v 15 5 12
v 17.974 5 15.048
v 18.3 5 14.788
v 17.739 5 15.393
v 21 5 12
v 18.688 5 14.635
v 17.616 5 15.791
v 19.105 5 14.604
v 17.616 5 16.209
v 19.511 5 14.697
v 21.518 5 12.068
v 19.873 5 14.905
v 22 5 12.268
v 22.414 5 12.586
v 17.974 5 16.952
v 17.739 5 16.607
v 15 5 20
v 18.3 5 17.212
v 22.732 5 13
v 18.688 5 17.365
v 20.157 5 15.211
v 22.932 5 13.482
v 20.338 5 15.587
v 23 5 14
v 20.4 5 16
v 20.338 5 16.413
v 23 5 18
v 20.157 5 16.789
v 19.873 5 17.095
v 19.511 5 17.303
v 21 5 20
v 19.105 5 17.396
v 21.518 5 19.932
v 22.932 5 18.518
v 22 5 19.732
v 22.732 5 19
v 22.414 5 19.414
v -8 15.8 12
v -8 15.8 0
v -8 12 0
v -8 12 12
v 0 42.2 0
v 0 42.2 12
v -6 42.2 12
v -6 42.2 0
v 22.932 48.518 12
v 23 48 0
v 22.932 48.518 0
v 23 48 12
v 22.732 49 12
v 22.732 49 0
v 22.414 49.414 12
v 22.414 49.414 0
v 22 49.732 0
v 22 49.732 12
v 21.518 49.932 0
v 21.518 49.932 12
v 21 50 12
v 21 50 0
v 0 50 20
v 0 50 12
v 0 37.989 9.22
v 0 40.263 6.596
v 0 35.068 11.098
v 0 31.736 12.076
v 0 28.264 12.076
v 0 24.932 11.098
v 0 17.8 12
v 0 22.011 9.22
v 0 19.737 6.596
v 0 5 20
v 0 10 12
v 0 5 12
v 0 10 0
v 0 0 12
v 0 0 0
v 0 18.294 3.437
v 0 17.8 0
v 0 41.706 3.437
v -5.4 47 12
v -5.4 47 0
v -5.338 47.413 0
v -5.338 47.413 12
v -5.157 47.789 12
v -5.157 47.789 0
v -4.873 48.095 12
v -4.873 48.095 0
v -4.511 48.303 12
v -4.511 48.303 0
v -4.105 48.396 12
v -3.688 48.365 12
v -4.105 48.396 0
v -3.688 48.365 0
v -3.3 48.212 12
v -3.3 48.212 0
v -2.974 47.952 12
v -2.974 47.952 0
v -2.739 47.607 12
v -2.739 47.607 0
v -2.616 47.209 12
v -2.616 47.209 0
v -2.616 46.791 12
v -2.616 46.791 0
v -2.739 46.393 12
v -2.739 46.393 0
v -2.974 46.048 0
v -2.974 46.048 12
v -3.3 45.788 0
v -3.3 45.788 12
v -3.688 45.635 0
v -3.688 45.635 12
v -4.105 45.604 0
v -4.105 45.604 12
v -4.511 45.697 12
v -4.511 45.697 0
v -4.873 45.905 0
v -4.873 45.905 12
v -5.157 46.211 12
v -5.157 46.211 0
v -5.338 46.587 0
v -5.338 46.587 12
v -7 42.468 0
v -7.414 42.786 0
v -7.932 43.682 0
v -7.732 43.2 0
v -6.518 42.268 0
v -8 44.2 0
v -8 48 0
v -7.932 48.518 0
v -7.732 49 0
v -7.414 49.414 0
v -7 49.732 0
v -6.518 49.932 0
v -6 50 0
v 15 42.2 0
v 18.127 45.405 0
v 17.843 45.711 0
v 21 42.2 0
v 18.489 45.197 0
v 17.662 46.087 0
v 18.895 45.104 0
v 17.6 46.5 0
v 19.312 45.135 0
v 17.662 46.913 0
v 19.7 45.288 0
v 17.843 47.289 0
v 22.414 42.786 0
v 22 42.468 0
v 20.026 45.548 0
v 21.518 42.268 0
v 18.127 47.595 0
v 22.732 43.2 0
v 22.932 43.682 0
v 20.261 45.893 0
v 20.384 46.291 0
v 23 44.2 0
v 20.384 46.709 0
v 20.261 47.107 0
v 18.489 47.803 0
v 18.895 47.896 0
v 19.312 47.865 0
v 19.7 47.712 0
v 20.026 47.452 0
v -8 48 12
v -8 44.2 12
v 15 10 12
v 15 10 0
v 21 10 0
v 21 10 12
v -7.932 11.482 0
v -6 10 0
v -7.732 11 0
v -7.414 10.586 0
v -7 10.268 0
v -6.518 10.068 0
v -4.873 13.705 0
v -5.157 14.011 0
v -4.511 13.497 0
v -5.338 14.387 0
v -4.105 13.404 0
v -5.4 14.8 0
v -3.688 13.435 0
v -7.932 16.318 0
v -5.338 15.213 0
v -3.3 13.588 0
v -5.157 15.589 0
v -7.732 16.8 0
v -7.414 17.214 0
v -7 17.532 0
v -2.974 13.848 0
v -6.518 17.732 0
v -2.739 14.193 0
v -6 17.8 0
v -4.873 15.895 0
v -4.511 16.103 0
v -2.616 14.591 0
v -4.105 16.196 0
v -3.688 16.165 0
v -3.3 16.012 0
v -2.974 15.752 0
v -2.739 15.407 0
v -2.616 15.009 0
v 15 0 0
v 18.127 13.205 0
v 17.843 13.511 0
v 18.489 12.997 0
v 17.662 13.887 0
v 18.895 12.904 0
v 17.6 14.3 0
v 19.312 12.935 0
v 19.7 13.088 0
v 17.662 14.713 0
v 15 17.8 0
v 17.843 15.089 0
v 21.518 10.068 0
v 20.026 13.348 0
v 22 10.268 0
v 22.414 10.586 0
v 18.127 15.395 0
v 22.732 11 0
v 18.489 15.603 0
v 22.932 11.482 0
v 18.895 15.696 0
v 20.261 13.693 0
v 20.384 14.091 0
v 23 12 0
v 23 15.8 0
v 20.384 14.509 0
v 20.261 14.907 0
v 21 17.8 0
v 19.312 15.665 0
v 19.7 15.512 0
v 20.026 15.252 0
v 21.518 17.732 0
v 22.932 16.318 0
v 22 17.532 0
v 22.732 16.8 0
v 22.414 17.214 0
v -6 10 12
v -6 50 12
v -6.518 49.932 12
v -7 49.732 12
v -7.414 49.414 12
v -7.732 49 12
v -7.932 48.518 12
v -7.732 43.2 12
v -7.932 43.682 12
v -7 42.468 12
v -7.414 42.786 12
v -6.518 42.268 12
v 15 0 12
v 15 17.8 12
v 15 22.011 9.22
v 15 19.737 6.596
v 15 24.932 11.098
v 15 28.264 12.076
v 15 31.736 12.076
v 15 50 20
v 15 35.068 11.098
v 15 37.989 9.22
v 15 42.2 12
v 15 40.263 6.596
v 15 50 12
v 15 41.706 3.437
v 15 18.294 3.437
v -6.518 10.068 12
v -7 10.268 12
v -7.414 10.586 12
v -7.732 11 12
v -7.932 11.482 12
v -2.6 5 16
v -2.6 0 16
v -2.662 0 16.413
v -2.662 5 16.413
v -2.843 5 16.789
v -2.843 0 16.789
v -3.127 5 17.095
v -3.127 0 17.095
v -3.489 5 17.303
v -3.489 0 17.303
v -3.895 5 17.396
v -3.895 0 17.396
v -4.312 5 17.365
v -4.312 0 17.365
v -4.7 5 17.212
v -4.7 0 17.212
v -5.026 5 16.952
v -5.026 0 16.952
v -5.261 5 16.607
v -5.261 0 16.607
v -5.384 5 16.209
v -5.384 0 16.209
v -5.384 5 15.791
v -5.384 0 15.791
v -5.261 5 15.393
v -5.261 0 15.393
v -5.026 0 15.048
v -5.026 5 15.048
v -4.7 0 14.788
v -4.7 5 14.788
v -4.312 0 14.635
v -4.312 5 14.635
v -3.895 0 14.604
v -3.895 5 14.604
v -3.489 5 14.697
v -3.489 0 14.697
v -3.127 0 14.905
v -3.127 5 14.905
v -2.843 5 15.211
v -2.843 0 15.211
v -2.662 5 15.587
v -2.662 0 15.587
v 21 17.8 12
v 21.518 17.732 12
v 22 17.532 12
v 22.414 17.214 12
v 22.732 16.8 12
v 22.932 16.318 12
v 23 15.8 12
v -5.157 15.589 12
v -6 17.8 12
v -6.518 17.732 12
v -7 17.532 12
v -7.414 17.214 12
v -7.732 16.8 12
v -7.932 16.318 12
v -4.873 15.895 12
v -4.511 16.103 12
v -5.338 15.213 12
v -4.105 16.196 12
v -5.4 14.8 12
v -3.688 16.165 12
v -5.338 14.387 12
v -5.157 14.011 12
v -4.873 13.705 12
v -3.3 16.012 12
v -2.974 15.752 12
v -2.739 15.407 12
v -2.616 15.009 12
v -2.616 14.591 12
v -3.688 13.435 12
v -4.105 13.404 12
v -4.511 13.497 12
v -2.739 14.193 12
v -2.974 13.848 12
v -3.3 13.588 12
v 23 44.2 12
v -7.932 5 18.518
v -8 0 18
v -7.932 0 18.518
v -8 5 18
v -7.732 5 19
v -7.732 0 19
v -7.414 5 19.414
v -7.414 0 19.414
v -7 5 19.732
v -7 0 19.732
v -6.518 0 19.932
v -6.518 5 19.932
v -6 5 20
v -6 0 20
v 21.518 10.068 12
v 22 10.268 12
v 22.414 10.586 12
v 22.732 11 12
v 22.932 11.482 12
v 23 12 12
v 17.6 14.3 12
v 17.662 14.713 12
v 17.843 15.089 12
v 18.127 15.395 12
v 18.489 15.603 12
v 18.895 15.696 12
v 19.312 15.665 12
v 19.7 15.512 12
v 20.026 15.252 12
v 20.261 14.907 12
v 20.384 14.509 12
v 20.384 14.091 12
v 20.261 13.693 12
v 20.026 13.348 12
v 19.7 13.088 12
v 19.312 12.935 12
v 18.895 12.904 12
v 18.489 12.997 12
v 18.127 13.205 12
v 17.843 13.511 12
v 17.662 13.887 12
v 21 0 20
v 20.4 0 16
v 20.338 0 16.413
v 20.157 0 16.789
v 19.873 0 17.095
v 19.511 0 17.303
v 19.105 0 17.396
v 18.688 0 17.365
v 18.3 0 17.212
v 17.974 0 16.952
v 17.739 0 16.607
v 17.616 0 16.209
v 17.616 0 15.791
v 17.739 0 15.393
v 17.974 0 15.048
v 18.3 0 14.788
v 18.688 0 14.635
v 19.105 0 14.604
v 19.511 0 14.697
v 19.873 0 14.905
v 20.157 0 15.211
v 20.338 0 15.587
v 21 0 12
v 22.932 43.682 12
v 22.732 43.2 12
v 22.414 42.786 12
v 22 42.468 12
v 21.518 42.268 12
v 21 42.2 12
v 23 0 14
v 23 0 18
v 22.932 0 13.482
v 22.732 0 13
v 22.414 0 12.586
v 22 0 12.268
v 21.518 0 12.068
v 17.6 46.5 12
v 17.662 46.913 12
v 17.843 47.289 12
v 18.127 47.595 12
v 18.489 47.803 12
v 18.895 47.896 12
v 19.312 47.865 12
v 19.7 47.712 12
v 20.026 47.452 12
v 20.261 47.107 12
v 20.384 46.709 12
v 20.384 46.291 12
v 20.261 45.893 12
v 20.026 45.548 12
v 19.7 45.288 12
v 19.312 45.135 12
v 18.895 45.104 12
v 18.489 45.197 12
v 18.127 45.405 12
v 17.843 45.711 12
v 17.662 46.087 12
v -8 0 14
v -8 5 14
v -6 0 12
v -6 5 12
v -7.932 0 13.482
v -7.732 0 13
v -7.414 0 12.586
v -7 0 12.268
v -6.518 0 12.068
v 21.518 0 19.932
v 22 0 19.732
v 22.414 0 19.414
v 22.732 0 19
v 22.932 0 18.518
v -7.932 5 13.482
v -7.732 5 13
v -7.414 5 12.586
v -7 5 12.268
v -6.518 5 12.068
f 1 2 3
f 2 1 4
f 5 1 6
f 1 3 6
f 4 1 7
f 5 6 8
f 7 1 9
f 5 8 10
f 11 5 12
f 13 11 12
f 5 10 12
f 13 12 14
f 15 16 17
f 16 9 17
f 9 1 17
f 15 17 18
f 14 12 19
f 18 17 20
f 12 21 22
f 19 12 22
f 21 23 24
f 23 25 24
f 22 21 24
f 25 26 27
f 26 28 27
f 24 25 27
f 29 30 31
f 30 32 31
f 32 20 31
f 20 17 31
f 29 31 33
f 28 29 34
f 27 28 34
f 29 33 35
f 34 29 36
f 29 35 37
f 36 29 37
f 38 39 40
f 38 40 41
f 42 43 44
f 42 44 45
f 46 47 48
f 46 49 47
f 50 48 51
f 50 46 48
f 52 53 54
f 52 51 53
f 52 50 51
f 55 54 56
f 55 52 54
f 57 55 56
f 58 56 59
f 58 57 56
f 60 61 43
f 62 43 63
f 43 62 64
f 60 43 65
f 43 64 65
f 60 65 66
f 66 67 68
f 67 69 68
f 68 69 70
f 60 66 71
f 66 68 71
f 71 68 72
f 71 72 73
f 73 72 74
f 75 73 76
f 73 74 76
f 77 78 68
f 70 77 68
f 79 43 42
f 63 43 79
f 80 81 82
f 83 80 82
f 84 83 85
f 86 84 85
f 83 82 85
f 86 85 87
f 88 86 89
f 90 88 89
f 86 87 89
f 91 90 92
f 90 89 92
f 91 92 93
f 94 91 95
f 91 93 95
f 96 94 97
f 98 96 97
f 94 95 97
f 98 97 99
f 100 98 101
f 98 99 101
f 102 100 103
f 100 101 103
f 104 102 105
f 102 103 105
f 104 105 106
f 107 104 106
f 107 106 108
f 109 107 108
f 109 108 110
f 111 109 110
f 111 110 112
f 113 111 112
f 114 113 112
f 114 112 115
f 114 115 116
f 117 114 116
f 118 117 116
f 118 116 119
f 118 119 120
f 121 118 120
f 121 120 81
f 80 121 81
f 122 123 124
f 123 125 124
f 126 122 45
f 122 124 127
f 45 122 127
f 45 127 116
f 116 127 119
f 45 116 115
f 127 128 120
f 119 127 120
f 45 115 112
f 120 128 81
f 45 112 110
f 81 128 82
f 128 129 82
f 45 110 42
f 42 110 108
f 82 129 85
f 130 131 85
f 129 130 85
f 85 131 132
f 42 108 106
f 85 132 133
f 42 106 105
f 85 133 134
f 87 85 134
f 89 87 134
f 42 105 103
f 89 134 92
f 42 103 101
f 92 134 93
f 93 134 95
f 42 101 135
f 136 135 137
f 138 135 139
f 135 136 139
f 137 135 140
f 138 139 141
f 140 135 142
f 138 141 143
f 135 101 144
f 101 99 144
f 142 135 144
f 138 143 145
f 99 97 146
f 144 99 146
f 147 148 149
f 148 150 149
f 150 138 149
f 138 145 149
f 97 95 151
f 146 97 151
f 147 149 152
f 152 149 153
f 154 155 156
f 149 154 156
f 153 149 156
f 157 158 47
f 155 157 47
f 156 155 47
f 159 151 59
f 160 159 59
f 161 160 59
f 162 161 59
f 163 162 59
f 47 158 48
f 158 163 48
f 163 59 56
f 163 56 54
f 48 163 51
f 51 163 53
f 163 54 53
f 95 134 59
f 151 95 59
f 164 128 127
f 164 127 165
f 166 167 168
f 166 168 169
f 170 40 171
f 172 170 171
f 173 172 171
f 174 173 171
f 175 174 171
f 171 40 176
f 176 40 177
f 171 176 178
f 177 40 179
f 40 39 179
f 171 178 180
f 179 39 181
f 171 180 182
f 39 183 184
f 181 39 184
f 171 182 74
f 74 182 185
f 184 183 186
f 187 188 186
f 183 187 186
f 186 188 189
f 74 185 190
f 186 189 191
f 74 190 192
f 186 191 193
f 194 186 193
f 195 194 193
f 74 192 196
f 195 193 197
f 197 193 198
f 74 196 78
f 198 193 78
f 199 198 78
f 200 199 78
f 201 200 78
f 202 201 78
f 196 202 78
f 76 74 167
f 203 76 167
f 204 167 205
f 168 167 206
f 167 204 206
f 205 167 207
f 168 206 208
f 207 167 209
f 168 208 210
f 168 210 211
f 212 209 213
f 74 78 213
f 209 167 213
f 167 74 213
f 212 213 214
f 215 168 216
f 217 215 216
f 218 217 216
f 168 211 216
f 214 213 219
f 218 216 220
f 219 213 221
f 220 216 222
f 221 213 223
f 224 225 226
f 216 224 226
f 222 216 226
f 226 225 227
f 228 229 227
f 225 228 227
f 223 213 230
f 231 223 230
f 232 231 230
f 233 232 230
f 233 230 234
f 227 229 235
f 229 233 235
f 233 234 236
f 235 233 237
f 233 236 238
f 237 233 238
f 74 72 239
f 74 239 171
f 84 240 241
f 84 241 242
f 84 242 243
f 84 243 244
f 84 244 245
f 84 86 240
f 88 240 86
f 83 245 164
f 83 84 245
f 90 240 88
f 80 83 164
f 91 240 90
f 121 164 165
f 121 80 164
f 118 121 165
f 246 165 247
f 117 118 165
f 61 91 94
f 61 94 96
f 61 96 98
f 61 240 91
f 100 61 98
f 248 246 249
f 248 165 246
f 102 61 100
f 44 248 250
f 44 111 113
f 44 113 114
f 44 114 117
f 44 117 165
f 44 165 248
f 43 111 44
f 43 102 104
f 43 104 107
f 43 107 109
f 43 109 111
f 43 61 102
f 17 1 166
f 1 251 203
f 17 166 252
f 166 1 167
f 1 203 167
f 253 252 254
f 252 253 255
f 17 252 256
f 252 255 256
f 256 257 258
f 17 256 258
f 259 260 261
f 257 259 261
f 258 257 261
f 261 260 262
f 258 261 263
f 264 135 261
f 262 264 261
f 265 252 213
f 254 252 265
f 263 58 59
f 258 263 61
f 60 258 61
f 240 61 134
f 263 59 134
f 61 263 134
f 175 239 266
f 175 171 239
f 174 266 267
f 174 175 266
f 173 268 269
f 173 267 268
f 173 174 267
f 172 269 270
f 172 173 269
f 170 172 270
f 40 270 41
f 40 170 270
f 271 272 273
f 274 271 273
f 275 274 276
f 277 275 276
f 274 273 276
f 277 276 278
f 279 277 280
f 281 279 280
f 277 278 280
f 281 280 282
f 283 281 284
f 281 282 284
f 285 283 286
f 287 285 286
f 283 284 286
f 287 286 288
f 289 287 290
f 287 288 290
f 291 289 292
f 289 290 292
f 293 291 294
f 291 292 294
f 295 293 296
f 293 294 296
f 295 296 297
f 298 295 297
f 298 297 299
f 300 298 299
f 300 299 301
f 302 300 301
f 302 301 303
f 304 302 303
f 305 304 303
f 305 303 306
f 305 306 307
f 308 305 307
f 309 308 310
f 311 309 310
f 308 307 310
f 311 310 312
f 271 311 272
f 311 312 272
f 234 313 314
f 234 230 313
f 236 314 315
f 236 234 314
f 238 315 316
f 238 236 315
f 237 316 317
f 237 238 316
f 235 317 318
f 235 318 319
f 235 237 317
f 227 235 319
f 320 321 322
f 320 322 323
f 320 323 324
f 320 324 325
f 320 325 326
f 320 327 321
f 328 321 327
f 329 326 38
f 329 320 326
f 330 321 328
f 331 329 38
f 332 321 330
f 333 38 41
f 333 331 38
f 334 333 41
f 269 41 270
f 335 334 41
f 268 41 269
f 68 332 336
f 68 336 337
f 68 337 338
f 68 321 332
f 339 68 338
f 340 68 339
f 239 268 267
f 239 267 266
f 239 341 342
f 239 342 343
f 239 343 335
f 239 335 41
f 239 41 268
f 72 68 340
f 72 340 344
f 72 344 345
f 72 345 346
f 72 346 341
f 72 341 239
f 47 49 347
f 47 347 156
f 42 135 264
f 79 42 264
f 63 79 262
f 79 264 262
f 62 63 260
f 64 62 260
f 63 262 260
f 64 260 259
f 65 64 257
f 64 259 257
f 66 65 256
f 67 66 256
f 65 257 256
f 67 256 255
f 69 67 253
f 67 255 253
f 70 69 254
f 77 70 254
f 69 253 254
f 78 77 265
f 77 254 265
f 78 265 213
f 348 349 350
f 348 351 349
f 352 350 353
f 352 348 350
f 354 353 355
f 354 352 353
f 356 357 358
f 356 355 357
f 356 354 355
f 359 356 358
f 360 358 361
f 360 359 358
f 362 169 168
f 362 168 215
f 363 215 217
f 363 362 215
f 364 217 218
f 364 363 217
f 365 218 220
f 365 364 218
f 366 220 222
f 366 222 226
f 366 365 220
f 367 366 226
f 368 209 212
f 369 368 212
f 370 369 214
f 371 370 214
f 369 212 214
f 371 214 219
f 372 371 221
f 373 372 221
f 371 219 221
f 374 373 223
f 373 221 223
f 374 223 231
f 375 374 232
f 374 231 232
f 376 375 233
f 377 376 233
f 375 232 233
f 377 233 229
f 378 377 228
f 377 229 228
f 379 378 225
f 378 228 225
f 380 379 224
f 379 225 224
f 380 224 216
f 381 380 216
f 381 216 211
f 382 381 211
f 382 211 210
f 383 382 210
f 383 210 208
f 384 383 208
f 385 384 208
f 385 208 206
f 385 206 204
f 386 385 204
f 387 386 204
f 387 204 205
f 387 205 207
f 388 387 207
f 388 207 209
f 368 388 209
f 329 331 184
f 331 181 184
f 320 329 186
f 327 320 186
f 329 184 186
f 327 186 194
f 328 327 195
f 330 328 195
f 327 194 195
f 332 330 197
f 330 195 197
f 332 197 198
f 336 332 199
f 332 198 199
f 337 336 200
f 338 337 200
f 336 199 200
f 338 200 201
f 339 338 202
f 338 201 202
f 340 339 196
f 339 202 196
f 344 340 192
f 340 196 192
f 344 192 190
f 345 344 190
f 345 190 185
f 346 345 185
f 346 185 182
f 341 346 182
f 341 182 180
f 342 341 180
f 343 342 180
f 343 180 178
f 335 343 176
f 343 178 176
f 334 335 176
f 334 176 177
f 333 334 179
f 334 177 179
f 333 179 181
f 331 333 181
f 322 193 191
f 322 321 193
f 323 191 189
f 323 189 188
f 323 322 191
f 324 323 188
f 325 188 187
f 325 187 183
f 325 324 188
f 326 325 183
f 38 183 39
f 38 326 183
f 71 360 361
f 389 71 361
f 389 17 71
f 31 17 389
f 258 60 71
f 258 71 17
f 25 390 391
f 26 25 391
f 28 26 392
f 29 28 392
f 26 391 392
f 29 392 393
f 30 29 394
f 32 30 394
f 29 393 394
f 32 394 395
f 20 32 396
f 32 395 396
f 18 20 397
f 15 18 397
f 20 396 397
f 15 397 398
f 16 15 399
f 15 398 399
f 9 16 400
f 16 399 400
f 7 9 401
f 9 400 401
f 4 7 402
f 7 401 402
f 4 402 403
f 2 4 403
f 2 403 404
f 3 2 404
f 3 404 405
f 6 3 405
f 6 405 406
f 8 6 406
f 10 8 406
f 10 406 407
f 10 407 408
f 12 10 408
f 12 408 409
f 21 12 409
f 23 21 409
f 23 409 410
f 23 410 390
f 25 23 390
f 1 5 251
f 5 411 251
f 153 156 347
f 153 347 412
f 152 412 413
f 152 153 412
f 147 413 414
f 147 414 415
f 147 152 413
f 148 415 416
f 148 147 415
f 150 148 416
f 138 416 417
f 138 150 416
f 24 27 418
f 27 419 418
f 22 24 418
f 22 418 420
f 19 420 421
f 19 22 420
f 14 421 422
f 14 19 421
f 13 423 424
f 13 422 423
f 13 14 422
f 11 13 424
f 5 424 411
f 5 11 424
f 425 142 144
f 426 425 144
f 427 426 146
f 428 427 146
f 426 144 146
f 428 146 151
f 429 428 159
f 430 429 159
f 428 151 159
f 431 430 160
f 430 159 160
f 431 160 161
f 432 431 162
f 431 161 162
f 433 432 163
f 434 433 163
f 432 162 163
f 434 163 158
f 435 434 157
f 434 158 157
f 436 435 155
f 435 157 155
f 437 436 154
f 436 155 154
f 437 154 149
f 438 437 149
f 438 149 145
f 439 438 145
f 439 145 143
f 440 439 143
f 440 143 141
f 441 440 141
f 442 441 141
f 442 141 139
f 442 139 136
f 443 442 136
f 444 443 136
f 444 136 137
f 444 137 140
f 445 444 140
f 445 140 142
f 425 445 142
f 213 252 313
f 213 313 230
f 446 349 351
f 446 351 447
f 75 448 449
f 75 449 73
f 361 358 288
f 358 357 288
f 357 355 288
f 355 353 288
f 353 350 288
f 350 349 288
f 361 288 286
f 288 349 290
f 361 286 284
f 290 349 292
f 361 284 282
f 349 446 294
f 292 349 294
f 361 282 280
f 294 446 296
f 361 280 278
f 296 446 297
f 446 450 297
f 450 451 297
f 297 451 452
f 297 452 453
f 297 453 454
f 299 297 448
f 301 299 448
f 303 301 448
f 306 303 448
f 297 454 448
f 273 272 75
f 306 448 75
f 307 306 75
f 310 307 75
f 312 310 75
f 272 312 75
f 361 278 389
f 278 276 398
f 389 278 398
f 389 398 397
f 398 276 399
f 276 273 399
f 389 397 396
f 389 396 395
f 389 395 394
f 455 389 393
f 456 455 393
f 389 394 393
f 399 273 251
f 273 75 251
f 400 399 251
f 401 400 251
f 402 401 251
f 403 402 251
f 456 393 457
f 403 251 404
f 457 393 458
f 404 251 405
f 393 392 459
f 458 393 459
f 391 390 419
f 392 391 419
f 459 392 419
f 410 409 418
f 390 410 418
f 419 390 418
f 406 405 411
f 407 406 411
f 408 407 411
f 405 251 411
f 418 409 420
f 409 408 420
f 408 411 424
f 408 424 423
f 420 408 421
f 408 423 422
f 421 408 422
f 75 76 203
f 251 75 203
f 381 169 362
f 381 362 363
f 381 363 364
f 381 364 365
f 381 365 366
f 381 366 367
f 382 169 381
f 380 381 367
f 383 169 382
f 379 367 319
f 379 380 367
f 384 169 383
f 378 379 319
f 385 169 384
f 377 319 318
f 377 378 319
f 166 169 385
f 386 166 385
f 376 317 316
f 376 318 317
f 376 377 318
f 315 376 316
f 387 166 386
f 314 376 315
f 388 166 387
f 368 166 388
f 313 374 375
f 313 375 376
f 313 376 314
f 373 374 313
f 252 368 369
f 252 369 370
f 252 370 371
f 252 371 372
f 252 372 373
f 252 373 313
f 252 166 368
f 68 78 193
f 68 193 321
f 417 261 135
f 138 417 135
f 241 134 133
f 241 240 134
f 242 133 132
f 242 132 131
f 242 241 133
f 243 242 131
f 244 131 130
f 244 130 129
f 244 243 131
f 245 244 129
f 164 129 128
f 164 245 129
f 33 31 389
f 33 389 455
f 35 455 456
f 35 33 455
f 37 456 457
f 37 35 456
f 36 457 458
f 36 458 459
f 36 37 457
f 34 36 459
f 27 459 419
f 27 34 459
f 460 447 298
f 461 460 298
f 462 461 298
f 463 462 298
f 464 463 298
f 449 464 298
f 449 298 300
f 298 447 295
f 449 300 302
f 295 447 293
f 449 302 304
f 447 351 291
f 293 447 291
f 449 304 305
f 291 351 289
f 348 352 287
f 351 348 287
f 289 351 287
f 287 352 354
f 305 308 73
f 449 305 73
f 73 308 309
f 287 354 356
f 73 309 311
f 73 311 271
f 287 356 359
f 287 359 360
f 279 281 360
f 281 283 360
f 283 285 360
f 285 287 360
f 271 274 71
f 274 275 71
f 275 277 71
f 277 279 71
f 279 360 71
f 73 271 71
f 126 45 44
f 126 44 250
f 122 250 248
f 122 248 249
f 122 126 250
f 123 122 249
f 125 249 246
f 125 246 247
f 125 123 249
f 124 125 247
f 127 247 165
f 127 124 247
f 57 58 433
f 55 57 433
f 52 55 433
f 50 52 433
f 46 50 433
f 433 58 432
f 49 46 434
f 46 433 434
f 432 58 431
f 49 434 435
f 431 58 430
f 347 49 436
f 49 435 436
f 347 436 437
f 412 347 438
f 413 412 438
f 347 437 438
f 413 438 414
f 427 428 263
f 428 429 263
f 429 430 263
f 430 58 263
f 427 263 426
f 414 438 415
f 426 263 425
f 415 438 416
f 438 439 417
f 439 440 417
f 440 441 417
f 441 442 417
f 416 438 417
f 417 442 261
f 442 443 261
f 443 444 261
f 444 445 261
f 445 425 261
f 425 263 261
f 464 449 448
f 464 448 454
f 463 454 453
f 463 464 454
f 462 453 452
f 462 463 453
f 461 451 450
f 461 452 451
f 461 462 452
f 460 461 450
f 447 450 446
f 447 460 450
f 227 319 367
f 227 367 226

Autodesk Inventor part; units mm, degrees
ref_plane "YZ Plane" through (0, 0, 0) normal (1, 0, 0) x (0, 1, 0)
ref_plane "XZ Plane" through (0, 0, 0) normal (0, 1, 0) x (-1, 0, 0)
sketch "Sketch1" plane through (0, 0, 0) normal (0, 0, 1) x (1, 0, 0)
  line L0 (0, 0) -> (15, 0)
  line L1 (15, 0) -> (15, 50)
  line L2 (15, 50) -> (0, 50)
  line L3 (0, 50) -> (0, 0)
  dimension "d0" = 15
  dimension "d1" = 50
extrude "Extrusion1" add sketch "Sketch1" along normal blind 20
sketch "Sketch2" plane through (15, 0, 0) normal (1, 0, 0) x (0, 0, -1)
  circle A0 centre (0, 30) radius 12.2
  line L0 (0, 50) -> (-20, 50) projected
  line L1 (0, 0) -> (0, 50) projected
  line L2 (0, 50) -> (0, 0)
  line L3 (-20, 0) -> (-20, 50) projected
  point P0 (0, 17.8)
  point P1 (0, 42.2)
  dimension "d4" = 24.4
  dimension "d5" = 20
  dimension "d6" = 20
extrude "Extrusion2" cut sketch "Sketch2" against normal through all contours L1 A0 picked at (-4.6431, 33.0439)
sketch "Sketch3" plane through (15, 0, 20) normal (1, 0, 0) x (0, 0, -1)
  line L0 (20, 50) -> (0, 50) projected
  line L1 (20, 50) -> (8, 50)
  line L2 (8, 50) -> (8, 42.2)
  line L3 (8, 42.2) -> (20, 42.2)
  line L4 (20, 42.2) -> (20, 50)
  line L5 (-6.7049, 30) -> (32.7164, 30)
  line L6 (20, 10) -> (0, 10)
  line L7 (8, 10) -> (8, 17.8)
  line L8 (8, 17.8) -> (20, 17.8)
  line L9 (20, 17.8) -> (20, 10)
  point P0 (20, 0)
  dimension "d9" = 12
  dimension "d10" = 7.8
  dimension "d11" = 20
extrude "Extrusion3" add sketch "Sketch3" along normal blind 8
sketch "Sketch4" plane through (0, 0, 0) normal (0, 0, -1) x (-1, 0, 0)
  circle A0 centre (-19, 46.5) radius 1.4
  line L0 (0, 50) -> (-23, 50) projected
  line L1 (-23, 42.2) -> (-23, 50) projected
  circle A1 centre (-19, 14.3) radius 1.4
  line L2 (-15, 17.8) -> (-23, 17.8) projected
  line L3 (-23, 10) -> (-23, 17.8) projected
  point P0 (0, 0)
  dimension "d14" = 2.8
  dimension "d15" = 3.5
  dimension "d16" = 4
  dimension "d17" = 2.8
  dimension "d18" = 3.5
  dimension "d43" = 4
extrude "Extrusion4" cut sketch "Sketch4" against normal through all
sketch "Sketch5" plane through (0, 0, 20) normal (-1, 0, 0) x (0, 0, 1)
  line L0 (-20, 42.2) -> (-20, 50) projected
  line L1 (-8, 42.2) -> (-20, 42.2) projected
  line L2 (-20, 50) -> (-8, 50)
  line L3 (-8, 50) -> (-8, 42.2)
  line L4 (-8, 42.2) -> (-20, 42.2)
  line L5 (-20, 42.2) -> (-20, 50)
  arc A0 (-20, 17.8) -> (-20, 42.2) centre (-20, 30) ccw projected
  line L6 (-8, 10) -> (-20, 10) projected
  line L7 (-20, 17.8) -> (-8, 17.8)
  line L8 (-8, 17.8) -> (-8, 10)
  line L9 (-8, 10) -> (-20, 10)
  line L10 (-20, 10) -> (-20, 17.8)
  point P0 (-20, 0)
extrude "Extrusion5" add sketch "Sketch5" along normal blind 8
sketch "Sketch6" plane through (0, 0, 0) normal (0, 0, -1) x (-1, 0, 0)
  circle A0 centre (4, 47) radius 1.4
  line L0 (8, 50) -> (8, 42.2) projected
  line L1 (8, 50) -> (-23, 50) projected
  circle A1 centre (4, 14.8) radius 1.4
  line L2 (0, 17.8) -> (8, 17.8) projected
  line L3 (8, 17.8) -> (8, 10) projected
  point P0 (0, 0)
  point P1 (8, 46.1)
  dimension "d23" = 2.8
  dimension "d24" = 4
  dimension "d25" = 3
  dimension "d26" = 2.8
  dimension "d27" = 3
  dimension "d44" = 4
extrude "Extrusion6" cut sketch "Sketch6" against normal through all
ref_plane "Work Plane1" through (0, 0, 0) normal (0, -1, 0) x (1, 0, 0)
sketch "Sketch7" plane through (0, 0, 0) normal (0, -1, 0) x (1, 0, 0)
  line L0 (0, 0) -> (0, 20) projected
  line L1 (0, 20) -> (-8, 20)
  line L2 (-8, 20) -> (-8, 12)
  line L3 (-8, 12) -> (0, 12)
  line L4 (0, 12) -> (0, 20)
  line L5 (0, 0) -> (15, 0) projected
  line L6 (7.5, 0) -> (7.5, 20)
  line L7 (15, 20) -> (0, 20) projected
  circle A0 centre (-4, 16) radius 1.4
  line L8 (15, 0) -> (15, 20)
  line L9 (15, 20) -> (23, 20)
  line L10 (23, 20) -> (23, 12)
  line L11 (23, 12) -> (15, 12)
  circle A1 centre (19, 16) radius 1.4
  dimension "d30" = 8
  dimension "d31" = 8
  dimension "d32" = 2.8
  dimension "d41" = 4
extrude "Extrusion7" add sketch "Sketch7" against normal blind 5 contours L3 L2 L1 L0 | L8 L9 L10 L11
fillet "Fillet1" radius 2 2 edges at (23, 2.5, 20) (23, 2.5, 12)
fillet "Fillet2" radius 2 2 edges at (-8, 2.5, 12) (-8, 2.5, 20)
fillet "Fillet3" radius 2 2 edges at (23, 17.8, 6) (23, 10, 6)
fillet "Fillet4" radius 2 2 edges at (-8, 10, 6) (-8, 17.8, 6)
fillet "Fillet5" radius 2 2 edges at (-8, 50, 6) (-8, 42.2, 6)
fillet "Fillet6" radius 2 2 edges at (23, 50, 6) (23, 42.2, 6)
sketch "Sketch8" plane through (15, 10, 12) normal (0, 0, 1) x (1, 0, 0)
  point P0 (-15, -10)
sketch "Sketch9" plane through (0, 5, 0) normal (0, 1, 0) x (1, 0, 0)
  point P0 (0, 0)
sketch "Sketch10" plane through (15, 10, 12) normal (0, 0, 1) x (1, 0, 0)
  point P0 (-15, -10)
sketch "Sketch11" plane through (0, 42.2, 12) normal (0, 0, 1) x (1, 0, 0)
  point P0 (0, -42.2)
sketch "Sketch12" plane through (15, 42.2, 12) normal (0, 0, 1) x (1, 0, 0)
  point P0 (-15, -42.2)
sketch "Sketch13" plane through (0, 42.2, 12) normal (0, 0, 1) x (1, 0, 0)
  point P0 (0, -42.2)
properties part number "üst döner blok"
